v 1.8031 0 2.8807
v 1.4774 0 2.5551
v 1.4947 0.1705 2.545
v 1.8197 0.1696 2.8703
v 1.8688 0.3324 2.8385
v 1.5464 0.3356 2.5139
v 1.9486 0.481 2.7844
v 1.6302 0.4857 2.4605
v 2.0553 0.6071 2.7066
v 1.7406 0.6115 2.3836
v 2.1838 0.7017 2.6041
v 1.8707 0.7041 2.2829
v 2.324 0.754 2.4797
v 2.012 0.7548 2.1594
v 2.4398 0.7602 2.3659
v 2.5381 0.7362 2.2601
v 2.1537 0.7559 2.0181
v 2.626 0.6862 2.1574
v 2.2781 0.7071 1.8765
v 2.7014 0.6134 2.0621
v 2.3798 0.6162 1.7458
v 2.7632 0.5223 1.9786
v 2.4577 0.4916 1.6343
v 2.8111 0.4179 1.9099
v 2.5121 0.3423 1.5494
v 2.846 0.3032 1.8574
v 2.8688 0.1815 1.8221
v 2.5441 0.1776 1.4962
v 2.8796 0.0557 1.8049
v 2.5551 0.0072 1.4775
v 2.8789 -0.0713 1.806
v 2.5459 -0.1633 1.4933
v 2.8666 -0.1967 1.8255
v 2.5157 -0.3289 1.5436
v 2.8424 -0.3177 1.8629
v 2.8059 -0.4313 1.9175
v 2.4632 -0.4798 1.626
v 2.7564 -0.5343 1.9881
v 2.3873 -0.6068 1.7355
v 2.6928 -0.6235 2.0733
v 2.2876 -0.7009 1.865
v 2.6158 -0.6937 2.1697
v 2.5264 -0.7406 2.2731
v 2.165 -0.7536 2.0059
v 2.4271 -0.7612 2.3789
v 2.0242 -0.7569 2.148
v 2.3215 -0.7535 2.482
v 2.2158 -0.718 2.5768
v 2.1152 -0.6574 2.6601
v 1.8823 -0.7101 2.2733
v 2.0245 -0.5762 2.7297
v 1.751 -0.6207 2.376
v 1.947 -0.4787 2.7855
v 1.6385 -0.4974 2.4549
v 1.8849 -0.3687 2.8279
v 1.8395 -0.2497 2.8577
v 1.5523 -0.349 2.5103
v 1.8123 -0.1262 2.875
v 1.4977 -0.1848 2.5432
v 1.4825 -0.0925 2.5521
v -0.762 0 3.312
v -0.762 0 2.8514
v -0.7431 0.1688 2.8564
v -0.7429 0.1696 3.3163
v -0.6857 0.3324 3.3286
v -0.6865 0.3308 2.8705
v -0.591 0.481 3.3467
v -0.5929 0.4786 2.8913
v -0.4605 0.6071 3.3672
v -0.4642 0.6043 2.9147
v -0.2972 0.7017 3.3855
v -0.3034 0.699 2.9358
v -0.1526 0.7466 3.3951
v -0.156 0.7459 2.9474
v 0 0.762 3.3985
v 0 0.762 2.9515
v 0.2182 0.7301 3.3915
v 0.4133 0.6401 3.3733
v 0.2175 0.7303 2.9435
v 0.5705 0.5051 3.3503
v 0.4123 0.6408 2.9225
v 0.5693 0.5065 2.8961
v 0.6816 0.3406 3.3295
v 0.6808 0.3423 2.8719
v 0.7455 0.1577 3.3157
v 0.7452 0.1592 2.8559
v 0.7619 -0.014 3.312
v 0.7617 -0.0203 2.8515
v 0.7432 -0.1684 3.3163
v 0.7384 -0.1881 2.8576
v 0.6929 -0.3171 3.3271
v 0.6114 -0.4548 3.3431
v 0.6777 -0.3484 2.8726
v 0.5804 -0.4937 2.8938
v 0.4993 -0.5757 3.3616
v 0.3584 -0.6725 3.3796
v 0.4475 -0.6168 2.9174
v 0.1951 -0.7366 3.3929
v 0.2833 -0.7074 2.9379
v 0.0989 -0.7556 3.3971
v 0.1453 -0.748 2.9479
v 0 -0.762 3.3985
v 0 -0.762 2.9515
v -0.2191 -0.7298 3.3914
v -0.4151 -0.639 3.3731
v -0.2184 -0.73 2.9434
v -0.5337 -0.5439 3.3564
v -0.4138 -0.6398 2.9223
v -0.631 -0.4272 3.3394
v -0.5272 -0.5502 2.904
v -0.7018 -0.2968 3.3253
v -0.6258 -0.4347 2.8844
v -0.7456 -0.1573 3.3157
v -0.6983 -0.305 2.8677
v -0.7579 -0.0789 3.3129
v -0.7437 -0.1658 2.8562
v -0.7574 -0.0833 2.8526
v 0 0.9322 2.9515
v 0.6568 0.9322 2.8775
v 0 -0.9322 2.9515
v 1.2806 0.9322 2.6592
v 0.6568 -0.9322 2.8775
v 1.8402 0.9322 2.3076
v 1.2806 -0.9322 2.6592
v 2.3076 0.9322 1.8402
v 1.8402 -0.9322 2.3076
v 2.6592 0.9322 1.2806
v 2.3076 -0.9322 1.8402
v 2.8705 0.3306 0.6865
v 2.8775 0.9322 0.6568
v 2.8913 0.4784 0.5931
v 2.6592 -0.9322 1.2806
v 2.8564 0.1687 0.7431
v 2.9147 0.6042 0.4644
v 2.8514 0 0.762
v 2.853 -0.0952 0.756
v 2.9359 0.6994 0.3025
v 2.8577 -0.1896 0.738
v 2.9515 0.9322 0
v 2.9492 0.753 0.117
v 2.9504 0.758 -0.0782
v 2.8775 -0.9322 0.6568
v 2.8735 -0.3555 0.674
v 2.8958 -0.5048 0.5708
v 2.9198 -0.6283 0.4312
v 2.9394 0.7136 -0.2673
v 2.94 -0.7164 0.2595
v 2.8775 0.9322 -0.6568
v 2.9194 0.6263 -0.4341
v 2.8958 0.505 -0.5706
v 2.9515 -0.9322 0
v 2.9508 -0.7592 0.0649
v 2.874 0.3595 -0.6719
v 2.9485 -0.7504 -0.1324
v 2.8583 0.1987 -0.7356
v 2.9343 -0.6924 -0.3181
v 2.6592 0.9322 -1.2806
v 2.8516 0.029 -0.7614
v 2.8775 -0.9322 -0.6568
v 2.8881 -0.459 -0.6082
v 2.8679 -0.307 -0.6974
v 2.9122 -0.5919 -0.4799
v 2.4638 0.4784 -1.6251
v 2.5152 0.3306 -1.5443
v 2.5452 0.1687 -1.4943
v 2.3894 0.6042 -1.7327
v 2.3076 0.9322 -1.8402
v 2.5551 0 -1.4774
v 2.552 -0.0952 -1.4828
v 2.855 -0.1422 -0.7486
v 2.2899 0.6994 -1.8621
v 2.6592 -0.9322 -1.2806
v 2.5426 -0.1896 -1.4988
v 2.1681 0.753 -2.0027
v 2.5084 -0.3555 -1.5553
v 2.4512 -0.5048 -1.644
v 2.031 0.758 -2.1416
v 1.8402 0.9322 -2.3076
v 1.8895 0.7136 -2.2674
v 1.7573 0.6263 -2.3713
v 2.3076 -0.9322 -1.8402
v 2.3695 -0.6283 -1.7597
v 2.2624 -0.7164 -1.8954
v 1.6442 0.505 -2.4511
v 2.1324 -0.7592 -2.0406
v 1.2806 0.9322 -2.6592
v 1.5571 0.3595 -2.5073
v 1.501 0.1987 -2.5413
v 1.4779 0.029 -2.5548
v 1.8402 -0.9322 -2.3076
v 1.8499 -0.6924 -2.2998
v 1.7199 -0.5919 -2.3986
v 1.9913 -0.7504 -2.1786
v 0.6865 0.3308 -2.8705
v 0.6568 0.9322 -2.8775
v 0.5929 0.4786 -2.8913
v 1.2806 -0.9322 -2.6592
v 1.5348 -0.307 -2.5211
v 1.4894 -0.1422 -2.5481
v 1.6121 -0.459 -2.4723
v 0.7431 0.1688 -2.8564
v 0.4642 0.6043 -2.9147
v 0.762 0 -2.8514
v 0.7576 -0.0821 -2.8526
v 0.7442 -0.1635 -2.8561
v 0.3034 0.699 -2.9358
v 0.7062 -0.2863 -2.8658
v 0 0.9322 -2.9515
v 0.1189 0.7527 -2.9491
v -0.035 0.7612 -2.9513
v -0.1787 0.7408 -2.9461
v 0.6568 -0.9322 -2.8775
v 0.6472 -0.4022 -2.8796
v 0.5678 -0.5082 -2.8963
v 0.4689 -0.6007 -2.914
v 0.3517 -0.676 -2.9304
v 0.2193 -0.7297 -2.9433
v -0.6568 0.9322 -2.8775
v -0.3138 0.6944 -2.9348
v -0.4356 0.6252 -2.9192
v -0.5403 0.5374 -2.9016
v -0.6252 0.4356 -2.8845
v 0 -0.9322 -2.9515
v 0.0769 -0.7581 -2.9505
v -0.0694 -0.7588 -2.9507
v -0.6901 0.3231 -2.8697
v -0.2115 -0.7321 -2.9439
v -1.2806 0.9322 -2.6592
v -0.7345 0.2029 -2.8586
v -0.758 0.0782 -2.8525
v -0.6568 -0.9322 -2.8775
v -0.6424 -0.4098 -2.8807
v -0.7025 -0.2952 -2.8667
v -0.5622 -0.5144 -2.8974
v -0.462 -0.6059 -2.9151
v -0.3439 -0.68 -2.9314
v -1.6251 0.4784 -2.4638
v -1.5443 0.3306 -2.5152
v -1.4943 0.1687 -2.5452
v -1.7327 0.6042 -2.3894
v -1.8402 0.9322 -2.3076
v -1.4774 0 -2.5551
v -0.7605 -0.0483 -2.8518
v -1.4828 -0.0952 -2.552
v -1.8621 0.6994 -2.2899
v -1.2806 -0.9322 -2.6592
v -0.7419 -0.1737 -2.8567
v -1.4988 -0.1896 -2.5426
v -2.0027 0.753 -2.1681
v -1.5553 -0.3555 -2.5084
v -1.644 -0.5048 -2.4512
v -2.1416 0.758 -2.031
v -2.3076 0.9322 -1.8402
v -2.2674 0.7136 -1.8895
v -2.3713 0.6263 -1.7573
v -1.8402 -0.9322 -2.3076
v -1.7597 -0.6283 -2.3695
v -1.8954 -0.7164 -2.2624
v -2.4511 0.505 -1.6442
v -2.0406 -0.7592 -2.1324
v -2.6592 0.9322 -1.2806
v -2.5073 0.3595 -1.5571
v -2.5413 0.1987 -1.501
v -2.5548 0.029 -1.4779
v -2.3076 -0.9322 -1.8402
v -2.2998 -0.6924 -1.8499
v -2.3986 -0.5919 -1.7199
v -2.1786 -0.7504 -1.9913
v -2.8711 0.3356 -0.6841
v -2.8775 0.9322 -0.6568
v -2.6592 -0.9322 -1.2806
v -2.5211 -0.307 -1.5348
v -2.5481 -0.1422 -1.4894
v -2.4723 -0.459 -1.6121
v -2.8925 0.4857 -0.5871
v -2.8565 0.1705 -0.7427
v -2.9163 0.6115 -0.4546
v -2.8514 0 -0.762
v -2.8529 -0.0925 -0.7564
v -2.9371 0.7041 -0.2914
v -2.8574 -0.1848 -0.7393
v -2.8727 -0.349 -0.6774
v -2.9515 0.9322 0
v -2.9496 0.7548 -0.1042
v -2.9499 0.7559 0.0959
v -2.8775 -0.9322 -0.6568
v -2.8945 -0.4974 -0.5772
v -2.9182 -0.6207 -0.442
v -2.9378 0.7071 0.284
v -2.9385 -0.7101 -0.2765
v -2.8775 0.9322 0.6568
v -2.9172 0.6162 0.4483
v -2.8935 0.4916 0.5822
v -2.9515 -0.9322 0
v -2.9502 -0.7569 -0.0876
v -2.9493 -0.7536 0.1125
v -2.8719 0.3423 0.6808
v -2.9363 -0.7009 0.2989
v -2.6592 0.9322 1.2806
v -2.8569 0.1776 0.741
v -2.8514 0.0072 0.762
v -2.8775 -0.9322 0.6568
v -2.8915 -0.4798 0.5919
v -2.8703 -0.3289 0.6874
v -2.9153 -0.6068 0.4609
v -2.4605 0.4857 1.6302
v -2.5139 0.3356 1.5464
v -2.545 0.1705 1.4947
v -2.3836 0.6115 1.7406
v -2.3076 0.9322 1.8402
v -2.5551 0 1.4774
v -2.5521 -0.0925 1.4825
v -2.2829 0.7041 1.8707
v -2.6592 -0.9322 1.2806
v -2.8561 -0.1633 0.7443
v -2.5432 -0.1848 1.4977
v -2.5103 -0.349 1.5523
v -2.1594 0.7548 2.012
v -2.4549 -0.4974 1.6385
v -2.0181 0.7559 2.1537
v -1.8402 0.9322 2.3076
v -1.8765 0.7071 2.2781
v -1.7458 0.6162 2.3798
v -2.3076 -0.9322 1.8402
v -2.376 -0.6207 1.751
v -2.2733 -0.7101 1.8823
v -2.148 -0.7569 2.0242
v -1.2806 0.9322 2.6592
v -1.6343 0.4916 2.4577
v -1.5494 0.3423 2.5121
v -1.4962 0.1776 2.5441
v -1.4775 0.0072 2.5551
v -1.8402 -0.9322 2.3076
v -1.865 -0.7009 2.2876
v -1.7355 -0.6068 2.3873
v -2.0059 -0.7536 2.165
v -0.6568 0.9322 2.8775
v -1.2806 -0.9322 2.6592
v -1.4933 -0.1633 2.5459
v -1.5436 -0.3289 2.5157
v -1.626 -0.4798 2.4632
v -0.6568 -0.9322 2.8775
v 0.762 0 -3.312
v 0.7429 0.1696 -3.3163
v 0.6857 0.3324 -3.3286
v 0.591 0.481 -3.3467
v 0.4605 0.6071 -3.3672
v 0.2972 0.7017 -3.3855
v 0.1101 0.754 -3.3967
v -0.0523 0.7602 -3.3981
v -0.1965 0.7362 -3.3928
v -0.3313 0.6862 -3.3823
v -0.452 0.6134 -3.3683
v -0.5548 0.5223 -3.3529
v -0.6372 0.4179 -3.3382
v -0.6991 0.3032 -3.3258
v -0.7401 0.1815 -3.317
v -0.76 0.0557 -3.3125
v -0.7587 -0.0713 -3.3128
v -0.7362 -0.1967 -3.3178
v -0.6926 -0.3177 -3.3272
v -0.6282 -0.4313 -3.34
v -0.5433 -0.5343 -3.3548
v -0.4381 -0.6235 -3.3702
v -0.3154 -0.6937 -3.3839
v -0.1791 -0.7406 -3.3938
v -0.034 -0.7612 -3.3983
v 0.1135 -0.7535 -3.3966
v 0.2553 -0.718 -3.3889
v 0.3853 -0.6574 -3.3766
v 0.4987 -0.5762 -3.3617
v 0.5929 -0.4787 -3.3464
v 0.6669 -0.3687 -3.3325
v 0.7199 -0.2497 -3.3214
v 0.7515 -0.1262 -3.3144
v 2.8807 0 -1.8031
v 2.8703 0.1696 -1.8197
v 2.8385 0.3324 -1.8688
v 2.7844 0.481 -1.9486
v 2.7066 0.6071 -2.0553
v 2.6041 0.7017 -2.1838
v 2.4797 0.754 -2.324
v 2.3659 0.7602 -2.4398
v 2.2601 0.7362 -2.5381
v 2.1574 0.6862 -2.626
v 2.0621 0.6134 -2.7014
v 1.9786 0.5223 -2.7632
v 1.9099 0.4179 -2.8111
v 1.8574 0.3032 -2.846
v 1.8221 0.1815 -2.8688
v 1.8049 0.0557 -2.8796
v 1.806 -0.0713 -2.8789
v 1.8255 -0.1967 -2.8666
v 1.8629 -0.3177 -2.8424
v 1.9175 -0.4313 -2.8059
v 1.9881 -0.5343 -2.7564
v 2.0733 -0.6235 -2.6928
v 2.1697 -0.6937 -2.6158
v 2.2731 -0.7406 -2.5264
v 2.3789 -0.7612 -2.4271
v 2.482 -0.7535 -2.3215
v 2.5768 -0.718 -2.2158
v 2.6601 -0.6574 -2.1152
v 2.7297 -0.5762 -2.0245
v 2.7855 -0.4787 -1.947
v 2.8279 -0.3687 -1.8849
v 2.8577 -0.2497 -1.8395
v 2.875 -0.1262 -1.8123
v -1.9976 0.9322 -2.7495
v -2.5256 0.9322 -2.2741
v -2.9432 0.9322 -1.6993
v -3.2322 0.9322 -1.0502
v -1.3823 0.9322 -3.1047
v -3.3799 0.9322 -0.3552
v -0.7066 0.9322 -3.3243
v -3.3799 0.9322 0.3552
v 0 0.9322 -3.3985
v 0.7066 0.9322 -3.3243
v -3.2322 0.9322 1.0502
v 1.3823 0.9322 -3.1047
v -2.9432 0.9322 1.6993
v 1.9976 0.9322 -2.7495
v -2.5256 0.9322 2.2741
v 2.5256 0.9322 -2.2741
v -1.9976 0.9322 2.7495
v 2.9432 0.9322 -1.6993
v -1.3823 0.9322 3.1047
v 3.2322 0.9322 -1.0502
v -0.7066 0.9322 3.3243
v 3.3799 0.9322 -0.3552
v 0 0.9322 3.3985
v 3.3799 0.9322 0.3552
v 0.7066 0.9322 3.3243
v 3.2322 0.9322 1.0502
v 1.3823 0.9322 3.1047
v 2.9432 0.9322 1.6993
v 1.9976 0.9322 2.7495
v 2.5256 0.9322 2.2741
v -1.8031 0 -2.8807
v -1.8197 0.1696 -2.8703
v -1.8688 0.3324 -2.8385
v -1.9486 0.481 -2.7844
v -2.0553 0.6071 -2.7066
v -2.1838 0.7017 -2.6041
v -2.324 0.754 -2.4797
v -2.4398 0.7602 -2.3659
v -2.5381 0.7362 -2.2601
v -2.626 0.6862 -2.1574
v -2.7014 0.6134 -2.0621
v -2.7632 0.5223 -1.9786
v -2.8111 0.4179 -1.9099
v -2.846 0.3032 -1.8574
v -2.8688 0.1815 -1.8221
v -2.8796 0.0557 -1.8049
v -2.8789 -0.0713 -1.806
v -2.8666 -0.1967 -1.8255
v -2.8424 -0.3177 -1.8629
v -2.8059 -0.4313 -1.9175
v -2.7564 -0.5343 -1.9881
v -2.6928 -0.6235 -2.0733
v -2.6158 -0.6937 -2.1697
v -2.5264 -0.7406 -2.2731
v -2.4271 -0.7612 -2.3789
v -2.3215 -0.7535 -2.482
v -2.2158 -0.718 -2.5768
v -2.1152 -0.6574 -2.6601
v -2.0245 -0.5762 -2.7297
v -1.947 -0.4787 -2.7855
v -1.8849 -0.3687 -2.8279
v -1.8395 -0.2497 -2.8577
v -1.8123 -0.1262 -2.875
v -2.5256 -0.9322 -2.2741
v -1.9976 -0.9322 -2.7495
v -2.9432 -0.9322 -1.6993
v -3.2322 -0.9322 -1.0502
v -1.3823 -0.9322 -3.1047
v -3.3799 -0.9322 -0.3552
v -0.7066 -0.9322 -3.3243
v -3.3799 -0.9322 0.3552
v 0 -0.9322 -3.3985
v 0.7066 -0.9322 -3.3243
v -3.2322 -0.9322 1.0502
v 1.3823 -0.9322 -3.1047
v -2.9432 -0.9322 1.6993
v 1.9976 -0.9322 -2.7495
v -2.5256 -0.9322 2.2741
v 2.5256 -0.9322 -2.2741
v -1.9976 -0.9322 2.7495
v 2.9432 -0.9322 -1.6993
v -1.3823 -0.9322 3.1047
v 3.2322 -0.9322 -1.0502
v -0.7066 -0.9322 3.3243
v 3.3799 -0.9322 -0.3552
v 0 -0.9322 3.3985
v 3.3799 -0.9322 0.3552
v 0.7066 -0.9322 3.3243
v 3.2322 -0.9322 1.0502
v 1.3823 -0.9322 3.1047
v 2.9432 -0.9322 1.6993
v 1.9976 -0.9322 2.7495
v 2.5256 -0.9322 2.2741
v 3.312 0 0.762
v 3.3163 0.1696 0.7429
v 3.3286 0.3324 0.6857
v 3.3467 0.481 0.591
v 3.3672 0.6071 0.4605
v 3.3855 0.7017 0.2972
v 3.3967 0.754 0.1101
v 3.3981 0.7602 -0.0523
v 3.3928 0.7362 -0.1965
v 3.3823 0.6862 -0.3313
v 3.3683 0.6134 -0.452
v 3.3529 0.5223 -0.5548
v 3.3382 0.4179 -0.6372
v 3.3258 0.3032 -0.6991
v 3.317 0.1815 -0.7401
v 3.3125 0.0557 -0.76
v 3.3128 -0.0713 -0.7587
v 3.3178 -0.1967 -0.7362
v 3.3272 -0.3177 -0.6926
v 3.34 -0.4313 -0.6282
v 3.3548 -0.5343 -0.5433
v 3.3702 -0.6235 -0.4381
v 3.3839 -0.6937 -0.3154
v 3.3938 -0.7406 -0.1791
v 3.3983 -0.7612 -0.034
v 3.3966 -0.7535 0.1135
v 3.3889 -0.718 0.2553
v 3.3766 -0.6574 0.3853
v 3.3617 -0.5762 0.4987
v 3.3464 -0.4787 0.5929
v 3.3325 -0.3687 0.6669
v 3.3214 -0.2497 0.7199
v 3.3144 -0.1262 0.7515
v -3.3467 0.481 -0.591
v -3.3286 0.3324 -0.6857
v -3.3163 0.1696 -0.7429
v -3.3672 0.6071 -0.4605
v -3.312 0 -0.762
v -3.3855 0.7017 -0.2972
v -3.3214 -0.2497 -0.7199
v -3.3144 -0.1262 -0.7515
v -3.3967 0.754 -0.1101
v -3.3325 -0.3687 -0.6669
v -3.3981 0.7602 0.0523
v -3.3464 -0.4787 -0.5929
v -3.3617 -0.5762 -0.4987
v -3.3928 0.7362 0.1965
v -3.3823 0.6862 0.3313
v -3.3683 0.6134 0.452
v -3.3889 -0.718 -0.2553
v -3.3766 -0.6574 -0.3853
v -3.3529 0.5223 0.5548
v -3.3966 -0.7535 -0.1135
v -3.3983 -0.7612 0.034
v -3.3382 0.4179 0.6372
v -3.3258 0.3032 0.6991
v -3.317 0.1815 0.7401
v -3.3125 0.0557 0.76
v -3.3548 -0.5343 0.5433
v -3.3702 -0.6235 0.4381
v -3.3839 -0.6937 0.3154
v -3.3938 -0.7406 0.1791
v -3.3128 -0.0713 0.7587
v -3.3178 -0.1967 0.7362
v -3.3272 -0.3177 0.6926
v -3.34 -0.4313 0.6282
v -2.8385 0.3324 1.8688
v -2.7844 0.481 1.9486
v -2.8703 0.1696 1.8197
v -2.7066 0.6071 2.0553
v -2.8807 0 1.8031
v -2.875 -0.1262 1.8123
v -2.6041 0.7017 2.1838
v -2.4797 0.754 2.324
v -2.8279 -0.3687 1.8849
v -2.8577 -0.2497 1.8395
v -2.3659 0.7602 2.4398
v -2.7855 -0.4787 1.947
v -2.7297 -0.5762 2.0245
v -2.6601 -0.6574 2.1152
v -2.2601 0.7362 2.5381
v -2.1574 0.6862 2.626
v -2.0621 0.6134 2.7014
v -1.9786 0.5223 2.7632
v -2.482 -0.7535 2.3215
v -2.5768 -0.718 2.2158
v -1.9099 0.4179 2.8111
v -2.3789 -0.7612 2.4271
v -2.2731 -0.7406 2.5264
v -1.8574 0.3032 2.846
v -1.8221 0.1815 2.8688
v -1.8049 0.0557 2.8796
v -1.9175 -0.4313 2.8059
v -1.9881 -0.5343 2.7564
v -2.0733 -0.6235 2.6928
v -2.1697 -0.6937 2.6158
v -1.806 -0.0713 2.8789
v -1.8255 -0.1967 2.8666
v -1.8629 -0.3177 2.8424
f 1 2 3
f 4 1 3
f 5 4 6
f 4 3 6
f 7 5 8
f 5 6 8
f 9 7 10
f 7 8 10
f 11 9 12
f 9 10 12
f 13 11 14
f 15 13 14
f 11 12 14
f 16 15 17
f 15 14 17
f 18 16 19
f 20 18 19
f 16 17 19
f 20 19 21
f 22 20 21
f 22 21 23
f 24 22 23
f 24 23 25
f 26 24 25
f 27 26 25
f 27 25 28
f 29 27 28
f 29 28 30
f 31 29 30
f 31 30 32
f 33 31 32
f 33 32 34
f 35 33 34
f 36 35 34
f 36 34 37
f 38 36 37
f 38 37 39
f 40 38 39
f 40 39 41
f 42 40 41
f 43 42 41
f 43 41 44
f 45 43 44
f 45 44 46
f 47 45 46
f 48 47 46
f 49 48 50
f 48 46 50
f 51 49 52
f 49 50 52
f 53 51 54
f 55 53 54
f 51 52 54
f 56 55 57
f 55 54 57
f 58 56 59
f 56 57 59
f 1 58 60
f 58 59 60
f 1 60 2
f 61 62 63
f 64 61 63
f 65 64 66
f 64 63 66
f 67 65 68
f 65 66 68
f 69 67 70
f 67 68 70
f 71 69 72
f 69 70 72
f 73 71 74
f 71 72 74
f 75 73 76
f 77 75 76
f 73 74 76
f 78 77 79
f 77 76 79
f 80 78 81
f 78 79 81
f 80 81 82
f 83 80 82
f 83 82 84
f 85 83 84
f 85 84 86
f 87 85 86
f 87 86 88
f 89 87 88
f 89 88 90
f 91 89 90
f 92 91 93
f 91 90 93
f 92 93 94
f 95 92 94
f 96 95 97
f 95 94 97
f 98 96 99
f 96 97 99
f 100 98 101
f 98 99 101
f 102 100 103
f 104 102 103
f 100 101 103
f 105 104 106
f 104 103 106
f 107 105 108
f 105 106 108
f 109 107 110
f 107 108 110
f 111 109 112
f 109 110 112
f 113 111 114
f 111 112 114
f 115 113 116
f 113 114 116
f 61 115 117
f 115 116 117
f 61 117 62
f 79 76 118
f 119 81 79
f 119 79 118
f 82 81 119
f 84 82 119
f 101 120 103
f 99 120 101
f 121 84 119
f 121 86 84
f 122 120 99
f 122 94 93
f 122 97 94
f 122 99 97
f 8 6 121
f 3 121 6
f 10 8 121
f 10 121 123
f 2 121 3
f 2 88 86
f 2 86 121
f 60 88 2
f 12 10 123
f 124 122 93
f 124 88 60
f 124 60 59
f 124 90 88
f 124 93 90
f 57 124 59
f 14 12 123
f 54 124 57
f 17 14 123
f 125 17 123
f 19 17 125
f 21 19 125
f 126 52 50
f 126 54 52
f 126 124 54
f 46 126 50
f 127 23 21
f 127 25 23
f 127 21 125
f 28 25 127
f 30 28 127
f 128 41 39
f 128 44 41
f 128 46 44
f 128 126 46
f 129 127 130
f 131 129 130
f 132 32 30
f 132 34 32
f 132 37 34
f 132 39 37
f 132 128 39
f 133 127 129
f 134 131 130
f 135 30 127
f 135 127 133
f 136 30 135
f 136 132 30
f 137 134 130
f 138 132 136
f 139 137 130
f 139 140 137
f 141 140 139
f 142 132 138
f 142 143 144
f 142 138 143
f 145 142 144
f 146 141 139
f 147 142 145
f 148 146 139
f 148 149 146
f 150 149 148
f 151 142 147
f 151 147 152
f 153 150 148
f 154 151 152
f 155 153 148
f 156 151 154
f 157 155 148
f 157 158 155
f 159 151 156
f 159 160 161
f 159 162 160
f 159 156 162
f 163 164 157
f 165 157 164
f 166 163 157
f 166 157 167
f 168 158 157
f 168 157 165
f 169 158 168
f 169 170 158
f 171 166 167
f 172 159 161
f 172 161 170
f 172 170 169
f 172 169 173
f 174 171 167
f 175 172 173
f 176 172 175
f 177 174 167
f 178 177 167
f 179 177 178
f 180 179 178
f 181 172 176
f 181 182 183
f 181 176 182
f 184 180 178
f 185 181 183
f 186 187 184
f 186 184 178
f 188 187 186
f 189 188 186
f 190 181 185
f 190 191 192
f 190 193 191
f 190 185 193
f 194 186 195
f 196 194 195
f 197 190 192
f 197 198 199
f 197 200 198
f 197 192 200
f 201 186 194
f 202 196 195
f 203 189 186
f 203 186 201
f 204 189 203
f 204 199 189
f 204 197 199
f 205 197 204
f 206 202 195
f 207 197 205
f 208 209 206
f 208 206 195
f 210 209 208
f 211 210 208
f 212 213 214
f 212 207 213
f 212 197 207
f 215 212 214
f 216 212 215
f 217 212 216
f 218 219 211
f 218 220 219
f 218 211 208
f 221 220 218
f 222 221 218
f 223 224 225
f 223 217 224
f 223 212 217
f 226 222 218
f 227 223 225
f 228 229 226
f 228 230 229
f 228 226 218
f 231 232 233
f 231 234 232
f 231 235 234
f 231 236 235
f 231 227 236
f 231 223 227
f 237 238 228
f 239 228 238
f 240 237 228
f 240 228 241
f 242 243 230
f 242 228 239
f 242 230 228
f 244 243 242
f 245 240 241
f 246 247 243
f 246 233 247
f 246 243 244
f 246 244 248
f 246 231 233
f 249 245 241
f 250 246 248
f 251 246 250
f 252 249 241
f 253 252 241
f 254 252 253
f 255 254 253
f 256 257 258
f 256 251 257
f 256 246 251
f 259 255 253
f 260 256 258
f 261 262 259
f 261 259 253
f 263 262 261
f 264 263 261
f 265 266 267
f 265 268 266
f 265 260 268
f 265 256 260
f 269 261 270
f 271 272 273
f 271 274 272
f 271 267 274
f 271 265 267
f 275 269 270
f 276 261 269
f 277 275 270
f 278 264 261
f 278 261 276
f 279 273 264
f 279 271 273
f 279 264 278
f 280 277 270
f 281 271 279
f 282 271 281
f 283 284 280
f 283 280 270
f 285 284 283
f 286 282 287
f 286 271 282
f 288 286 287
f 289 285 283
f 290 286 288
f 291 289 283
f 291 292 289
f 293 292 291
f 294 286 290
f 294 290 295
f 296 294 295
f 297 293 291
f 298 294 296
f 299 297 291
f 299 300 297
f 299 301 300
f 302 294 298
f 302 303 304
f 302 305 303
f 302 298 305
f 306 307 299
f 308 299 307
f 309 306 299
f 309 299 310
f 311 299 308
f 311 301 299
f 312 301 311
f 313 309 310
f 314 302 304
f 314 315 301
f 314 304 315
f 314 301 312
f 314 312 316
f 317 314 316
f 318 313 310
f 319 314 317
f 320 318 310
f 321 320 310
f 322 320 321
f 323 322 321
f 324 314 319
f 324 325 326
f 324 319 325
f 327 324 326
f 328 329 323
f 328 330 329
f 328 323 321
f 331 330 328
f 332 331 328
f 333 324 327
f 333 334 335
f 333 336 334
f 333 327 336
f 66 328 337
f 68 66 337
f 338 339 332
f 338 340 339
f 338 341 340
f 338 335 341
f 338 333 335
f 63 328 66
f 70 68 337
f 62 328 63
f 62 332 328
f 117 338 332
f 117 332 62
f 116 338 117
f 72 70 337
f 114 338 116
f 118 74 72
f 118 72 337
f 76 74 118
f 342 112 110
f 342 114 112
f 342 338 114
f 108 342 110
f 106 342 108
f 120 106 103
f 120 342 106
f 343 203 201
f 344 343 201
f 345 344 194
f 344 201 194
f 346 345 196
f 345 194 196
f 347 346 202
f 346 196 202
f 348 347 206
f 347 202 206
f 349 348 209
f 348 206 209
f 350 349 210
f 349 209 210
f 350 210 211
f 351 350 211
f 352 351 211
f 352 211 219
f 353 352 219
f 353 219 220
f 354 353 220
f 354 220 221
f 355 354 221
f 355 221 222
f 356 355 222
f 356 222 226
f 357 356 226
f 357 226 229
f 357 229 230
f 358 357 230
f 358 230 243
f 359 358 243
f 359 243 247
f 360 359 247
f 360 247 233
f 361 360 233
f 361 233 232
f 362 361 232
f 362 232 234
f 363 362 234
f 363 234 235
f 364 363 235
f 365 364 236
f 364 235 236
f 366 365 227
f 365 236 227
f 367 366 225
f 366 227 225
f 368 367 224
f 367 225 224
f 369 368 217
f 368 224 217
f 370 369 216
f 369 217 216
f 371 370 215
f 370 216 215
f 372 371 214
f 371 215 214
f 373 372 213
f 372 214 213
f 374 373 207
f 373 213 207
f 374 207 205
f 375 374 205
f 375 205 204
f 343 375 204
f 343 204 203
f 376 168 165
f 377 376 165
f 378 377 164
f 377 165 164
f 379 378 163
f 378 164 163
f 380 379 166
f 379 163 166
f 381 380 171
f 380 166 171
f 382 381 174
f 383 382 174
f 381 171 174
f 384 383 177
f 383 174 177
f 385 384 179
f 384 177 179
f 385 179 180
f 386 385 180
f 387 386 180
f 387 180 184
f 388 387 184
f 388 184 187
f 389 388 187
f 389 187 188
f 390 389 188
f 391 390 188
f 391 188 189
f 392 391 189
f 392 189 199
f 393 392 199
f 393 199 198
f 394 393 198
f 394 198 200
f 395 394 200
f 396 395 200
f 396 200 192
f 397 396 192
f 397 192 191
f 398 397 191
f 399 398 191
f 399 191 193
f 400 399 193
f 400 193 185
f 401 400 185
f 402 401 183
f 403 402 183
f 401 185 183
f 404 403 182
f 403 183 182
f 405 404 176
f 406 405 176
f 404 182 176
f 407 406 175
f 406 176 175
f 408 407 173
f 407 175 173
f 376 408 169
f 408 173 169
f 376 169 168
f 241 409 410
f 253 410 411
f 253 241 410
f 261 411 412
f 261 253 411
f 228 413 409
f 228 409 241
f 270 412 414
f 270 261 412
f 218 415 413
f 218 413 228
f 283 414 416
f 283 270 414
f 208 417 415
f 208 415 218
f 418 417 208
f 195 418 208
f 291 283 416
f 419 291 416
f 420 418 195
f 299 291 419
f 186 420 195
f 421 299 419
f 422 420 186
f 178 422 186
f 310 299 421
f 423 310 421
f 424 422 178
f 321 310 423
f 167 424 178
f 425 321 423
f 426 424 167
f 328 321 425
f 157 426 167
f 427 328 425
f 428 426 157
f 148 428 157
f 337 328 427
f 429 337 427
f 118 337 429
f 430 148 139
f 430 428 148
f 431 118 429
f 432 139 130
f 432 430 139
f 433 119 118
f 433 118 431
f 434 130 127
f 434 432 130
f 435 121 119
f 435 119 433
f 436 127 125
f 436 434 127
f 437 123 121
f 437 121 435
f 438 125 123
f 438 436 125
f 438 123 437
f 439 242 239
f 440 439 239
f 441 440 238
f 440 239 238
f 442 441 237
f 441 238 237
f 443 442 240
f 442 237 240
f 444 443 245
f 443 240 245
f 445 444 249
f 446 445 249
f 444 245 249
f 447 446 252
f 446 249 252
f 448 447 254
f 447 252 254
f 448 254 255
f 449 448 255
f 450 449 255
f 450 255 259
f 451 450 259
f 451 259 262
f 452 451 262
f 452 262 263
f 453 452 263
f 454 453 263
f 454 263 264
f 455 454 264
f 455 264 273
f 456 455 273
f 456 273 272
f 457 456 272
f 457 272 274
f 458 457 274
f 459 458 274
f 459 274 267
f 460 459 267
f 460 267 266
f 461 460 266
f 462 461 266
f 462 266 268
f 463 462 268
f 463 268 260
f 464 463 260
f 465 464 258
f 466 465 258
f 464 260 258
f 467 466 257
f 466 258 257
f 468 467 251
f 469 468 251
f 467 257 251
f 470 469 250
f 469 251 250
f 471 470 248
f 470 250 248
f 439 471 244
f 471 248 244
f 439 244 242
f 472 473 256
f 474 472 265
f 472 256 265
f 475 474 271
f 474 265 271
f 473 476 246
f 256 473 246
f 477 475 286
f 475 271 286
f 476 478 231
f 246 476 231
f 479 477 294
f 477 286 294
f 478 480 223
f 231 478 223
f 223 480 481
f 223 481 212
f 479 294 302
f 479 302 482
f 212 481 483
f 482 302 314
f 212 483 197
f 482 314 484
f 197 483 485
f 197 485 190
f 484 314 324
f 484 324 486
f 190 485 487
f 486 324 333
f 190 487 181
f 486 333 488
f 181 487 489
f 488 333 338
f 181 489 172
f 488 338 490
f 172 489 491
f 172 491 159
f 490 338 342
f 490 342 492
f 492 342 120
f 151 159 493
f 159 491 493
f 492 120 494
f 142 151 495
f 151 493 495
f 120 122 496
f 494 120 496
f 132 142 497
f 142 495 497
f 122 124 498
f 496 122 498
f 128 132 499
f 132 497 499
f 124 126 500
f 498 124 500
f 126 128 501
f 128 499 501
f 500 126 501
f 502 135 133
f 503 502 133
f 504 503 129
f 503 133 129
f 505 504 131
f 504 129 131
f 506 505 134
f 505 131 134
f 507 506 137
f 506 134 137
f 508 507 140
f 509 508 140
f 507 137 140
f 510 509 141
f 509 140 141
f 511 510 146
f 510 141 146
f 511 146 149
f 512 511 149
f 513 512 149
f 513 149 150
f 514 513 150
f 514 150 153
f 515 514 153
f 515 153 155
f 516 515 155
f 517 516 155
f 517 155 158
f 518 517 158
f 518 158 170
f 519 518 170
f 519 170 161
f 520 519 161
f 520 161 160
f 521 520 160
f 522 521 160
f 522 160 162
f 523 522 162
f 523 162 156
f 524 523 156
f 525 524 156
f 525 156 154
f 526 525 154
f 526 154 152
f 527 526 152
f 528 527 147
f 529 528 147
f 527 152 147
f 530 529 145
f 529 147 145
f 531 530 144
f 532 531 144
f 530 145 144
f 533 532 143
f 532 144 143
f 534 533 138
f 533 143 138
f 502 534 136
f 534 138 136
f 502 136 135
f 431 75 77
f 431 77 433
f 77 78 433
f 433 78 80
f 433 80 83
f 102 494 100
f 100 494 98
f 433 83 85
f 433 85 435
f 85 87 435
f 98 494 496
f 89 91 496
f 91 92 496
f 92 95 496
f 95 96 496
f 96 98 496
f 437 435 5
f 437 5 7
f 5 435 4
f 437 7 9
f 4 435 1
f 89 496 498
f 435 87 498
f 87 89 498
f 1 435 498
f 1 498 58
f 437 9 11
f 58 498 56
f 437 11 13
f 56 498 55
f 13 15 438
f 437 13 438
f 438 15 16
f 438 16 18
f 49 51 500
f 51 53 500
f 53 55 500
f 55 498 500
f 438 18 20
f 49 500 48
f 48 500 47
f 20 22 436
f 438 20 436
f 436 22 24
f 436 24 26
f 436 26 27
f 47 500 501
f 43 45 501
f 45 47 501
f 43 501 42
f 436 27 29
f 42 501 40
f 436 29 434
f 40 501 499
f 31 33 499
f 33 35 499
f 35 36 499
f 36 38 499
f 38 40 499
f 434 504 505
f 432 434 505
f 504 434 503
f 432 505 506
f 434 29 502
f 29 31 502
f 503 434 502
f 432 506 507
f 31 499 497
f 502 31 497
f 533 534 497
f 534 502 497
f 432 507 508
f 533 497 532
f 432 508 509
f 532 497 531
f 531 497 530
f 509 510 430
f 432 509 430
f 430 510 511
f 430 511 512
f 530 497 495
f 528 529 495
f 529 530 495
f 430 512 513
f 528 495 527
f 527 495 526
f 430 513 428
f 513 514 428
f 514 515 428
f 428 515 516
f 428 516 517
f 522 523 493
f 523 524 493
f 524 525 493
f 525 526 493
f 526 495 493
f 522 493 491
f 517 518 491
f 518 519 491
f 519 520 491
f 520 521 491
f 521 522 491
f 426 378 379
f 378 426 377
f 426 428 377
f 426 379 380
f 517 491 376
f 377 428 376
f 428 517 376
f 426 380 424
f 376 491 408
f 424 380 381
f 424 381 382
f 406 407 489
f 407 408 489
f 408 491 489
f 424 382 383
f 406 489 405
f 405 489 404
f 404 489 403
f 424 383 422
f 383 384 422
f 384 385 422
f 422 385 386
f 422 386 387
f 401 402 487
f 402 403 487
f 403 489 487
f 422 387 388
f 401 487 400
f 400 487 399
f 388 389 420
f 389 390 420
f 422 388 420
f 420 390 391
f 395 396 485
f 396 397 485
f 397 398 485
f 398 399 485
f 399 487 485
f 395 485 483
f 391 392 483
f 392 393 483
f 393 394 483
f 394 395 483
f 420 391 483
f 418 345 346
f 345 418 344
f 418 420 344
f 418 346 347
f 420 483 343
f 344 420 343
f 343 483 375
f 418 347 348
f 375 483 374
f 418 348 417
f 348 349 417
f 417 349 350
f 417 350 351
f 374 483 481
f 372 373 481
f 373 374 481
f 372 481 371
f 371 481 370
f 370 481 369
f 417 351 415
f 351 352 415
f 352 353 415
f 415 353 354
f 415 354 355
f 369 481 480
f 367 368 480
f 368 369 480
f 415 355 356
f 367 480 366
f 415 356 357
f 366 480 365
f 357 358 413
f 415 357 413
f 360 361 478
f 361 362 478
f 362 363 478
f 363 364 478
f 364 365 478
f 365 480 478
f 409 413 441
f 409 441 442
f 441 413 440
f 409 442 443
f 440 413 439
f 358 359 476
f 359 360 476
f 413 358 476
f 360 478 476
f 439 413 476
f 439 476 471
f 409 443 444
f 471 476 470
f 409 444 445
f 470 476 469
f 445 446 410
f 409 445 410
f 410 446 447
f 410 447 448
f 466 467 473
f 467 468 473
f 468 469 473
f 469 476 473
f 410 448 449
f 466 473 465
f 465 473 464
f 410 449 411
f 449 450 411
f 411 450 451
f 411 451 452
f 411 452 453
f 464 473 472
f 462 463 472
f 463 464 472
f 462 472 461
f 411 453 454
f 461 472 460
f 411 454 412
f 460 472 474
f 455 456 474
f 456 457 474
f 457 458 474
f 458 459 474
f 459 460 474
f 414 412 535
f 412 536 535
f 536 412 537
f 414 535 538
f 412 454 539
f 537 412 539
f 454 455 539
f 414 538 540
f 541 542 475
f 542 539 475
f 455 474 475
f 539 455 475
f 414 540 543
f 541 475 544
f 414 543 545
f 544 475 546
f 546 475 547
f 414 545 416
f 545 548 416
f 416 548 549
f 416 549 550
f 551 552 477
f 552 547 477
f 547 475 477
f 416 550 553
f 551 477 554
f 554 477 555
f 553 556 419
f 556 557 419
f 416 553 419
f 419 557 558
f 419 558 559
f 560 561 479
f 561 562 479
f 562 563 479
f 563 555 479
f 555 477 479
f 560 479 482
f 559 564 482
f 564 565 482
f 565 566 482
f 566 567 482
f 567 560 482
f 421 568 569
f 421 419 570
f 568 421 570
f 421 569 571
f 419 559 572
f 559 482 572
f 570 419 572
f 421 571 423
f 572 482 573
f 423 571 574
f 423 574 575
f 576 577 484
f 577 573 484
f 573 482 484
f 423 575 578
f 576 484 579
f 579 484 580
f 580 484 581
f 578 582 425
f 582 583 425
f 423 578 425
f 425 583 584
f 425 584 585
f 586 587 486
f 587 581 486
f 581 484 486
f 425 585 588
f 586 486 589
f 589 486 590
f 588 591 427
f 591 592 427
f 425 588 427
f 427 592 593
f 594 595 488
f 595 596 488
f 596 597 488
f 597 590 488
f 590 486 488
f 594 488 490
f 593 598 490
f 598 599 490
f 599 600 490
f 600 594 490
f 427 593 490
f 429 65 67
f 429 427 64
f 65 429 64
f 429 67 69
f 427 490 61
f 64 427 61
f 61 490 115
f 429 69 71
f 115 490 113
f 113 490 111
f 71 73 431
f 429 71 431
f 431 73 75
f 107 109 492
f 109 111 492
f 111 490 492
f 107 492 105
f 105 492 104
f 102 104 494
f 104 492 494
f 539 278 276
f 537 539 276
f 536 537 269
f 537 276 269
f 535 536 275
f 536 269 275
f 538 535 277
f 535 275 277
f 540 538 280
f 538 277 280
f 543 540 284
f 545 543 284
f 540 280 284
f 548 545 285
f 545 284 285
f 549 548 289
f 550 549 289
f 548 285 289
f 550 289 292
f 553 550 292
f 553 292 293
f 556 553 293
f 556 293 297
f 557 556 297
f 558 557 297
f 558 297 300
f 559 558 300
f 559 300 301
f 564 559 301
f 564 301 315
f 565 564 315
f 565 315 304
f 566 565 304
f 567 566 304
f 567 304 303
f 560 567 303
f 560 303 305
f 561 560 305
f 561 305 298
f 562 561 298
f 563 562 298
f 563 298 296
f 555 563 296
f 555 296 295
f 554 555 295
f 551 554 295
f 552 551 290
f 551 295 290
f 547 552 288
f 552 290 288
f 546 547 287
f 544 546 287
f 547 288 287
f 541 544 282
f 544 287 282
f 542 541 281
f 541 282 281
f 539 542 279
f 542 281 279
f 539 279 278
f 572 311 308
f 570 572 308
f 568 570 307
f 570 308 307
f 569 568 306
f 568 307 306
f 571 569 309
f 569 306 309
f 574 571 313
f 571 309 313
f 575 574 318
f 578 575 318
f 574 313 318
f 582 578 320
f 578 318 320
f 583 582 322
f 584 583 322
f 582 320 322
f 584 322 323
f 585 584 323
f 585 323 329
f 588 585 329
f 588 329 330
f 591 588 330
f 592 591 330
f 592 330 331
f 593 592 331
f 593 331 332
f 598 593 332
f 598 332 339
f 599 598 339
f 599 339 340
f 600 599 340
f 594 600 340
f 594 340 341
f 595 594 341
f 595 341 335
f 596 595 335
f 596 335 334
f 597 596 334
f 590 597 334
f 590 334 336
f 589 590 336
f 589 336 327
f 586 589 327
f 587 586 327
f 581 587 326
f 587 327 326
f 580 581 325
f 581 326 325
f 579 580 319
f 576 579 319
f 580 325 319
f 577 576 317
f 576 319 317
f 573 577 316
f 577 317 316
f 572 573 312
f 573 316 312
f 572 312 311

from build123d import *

# Parameters (mm, degrees)
BOSS_EXTRUDE1_DEPTH      = 0.93218
BOSS_EXTRUDE1_DEPTH_BACK = 0.93218
SKETCH1_R                = 3.39852
SKETCH1_R_2              = 2.95148
CUT_EXTRUDE1_REACH       = 6.896
CUT_EXTRUDE1_END_RADIUS  = 3.39852
SKETCH3_R                = 0.762
CIRPATTERN1_COUNT        = 8


with BuildPart() as part:
    # Sketch1 → Boss-Extrude1 (new, two sides: drawn at the far end of the back side and taken through both)
    with BuildSketch(Plane(origin=(0, 0, 0), x_dir=(1, 0, 0), z_dir=(0, 1, 0)).offset(-BOSS_EXTRUDE1_DEPTH_BACK)):
        with Locations(Location((0, 0, 0), (0, 0, 270))):
            Circle(SKETCH1_R)
        with Locations(Location((0, 0, 0), (0, 0, 270))):
            Circle(SKETCH1_R_2, mode=Mode.SUBTRACT)
    extrude(amount=BOSS_EXTRUDE1_DEPTH + BOSS_EXTRUDE1_DEPTH_BACK)

    # Cut-Extrude1: up to this cylinder (the profile starts inside it)
    cut_extrude1_end = Plane(origin=(0, 0, 0), z_dir=(0, 1, 0)) * Cylinder(CUT_EXTRUDE1_END_RADIUS, 21.58904, mode=Mode.PRIVATE)
    # Sketch3 → Cut-Extrude1 (cut, up to the surface)
    with BuildSketch(Plane.XY, mode=Mode.PRIVATE) as cut_extrude1_sk1:
        Circle(SKETCH3_R)
    cut_extrude1_tool1 = extrude(cut_extrude1_sk1.sketch, amount=-CUT_EXTRUDE1_REACH, mode=Mode.PRIVATE) & cut_extrude1_end
    cut_extrude1 = cut_extrude1_tool1.solids().sort_by_distance((0, 0, 0))[0]
    add(cut_extrude1, mode=Mode.SUBTRACT)

    # CirPattern1: Cut-Extrude1 ×8 about axis
    cirpattern1_axis = Axis((0, 0, 0), (0, 1, 0))
    for i in range(1, CIRPATTERN1_COUNT):
        add(cut_extrude1.rotate(cirpattern1_axis, i * 360 / CIRPATTERN1_COUNT), mode=Mode.SUBTRACT)


solid = part.part
